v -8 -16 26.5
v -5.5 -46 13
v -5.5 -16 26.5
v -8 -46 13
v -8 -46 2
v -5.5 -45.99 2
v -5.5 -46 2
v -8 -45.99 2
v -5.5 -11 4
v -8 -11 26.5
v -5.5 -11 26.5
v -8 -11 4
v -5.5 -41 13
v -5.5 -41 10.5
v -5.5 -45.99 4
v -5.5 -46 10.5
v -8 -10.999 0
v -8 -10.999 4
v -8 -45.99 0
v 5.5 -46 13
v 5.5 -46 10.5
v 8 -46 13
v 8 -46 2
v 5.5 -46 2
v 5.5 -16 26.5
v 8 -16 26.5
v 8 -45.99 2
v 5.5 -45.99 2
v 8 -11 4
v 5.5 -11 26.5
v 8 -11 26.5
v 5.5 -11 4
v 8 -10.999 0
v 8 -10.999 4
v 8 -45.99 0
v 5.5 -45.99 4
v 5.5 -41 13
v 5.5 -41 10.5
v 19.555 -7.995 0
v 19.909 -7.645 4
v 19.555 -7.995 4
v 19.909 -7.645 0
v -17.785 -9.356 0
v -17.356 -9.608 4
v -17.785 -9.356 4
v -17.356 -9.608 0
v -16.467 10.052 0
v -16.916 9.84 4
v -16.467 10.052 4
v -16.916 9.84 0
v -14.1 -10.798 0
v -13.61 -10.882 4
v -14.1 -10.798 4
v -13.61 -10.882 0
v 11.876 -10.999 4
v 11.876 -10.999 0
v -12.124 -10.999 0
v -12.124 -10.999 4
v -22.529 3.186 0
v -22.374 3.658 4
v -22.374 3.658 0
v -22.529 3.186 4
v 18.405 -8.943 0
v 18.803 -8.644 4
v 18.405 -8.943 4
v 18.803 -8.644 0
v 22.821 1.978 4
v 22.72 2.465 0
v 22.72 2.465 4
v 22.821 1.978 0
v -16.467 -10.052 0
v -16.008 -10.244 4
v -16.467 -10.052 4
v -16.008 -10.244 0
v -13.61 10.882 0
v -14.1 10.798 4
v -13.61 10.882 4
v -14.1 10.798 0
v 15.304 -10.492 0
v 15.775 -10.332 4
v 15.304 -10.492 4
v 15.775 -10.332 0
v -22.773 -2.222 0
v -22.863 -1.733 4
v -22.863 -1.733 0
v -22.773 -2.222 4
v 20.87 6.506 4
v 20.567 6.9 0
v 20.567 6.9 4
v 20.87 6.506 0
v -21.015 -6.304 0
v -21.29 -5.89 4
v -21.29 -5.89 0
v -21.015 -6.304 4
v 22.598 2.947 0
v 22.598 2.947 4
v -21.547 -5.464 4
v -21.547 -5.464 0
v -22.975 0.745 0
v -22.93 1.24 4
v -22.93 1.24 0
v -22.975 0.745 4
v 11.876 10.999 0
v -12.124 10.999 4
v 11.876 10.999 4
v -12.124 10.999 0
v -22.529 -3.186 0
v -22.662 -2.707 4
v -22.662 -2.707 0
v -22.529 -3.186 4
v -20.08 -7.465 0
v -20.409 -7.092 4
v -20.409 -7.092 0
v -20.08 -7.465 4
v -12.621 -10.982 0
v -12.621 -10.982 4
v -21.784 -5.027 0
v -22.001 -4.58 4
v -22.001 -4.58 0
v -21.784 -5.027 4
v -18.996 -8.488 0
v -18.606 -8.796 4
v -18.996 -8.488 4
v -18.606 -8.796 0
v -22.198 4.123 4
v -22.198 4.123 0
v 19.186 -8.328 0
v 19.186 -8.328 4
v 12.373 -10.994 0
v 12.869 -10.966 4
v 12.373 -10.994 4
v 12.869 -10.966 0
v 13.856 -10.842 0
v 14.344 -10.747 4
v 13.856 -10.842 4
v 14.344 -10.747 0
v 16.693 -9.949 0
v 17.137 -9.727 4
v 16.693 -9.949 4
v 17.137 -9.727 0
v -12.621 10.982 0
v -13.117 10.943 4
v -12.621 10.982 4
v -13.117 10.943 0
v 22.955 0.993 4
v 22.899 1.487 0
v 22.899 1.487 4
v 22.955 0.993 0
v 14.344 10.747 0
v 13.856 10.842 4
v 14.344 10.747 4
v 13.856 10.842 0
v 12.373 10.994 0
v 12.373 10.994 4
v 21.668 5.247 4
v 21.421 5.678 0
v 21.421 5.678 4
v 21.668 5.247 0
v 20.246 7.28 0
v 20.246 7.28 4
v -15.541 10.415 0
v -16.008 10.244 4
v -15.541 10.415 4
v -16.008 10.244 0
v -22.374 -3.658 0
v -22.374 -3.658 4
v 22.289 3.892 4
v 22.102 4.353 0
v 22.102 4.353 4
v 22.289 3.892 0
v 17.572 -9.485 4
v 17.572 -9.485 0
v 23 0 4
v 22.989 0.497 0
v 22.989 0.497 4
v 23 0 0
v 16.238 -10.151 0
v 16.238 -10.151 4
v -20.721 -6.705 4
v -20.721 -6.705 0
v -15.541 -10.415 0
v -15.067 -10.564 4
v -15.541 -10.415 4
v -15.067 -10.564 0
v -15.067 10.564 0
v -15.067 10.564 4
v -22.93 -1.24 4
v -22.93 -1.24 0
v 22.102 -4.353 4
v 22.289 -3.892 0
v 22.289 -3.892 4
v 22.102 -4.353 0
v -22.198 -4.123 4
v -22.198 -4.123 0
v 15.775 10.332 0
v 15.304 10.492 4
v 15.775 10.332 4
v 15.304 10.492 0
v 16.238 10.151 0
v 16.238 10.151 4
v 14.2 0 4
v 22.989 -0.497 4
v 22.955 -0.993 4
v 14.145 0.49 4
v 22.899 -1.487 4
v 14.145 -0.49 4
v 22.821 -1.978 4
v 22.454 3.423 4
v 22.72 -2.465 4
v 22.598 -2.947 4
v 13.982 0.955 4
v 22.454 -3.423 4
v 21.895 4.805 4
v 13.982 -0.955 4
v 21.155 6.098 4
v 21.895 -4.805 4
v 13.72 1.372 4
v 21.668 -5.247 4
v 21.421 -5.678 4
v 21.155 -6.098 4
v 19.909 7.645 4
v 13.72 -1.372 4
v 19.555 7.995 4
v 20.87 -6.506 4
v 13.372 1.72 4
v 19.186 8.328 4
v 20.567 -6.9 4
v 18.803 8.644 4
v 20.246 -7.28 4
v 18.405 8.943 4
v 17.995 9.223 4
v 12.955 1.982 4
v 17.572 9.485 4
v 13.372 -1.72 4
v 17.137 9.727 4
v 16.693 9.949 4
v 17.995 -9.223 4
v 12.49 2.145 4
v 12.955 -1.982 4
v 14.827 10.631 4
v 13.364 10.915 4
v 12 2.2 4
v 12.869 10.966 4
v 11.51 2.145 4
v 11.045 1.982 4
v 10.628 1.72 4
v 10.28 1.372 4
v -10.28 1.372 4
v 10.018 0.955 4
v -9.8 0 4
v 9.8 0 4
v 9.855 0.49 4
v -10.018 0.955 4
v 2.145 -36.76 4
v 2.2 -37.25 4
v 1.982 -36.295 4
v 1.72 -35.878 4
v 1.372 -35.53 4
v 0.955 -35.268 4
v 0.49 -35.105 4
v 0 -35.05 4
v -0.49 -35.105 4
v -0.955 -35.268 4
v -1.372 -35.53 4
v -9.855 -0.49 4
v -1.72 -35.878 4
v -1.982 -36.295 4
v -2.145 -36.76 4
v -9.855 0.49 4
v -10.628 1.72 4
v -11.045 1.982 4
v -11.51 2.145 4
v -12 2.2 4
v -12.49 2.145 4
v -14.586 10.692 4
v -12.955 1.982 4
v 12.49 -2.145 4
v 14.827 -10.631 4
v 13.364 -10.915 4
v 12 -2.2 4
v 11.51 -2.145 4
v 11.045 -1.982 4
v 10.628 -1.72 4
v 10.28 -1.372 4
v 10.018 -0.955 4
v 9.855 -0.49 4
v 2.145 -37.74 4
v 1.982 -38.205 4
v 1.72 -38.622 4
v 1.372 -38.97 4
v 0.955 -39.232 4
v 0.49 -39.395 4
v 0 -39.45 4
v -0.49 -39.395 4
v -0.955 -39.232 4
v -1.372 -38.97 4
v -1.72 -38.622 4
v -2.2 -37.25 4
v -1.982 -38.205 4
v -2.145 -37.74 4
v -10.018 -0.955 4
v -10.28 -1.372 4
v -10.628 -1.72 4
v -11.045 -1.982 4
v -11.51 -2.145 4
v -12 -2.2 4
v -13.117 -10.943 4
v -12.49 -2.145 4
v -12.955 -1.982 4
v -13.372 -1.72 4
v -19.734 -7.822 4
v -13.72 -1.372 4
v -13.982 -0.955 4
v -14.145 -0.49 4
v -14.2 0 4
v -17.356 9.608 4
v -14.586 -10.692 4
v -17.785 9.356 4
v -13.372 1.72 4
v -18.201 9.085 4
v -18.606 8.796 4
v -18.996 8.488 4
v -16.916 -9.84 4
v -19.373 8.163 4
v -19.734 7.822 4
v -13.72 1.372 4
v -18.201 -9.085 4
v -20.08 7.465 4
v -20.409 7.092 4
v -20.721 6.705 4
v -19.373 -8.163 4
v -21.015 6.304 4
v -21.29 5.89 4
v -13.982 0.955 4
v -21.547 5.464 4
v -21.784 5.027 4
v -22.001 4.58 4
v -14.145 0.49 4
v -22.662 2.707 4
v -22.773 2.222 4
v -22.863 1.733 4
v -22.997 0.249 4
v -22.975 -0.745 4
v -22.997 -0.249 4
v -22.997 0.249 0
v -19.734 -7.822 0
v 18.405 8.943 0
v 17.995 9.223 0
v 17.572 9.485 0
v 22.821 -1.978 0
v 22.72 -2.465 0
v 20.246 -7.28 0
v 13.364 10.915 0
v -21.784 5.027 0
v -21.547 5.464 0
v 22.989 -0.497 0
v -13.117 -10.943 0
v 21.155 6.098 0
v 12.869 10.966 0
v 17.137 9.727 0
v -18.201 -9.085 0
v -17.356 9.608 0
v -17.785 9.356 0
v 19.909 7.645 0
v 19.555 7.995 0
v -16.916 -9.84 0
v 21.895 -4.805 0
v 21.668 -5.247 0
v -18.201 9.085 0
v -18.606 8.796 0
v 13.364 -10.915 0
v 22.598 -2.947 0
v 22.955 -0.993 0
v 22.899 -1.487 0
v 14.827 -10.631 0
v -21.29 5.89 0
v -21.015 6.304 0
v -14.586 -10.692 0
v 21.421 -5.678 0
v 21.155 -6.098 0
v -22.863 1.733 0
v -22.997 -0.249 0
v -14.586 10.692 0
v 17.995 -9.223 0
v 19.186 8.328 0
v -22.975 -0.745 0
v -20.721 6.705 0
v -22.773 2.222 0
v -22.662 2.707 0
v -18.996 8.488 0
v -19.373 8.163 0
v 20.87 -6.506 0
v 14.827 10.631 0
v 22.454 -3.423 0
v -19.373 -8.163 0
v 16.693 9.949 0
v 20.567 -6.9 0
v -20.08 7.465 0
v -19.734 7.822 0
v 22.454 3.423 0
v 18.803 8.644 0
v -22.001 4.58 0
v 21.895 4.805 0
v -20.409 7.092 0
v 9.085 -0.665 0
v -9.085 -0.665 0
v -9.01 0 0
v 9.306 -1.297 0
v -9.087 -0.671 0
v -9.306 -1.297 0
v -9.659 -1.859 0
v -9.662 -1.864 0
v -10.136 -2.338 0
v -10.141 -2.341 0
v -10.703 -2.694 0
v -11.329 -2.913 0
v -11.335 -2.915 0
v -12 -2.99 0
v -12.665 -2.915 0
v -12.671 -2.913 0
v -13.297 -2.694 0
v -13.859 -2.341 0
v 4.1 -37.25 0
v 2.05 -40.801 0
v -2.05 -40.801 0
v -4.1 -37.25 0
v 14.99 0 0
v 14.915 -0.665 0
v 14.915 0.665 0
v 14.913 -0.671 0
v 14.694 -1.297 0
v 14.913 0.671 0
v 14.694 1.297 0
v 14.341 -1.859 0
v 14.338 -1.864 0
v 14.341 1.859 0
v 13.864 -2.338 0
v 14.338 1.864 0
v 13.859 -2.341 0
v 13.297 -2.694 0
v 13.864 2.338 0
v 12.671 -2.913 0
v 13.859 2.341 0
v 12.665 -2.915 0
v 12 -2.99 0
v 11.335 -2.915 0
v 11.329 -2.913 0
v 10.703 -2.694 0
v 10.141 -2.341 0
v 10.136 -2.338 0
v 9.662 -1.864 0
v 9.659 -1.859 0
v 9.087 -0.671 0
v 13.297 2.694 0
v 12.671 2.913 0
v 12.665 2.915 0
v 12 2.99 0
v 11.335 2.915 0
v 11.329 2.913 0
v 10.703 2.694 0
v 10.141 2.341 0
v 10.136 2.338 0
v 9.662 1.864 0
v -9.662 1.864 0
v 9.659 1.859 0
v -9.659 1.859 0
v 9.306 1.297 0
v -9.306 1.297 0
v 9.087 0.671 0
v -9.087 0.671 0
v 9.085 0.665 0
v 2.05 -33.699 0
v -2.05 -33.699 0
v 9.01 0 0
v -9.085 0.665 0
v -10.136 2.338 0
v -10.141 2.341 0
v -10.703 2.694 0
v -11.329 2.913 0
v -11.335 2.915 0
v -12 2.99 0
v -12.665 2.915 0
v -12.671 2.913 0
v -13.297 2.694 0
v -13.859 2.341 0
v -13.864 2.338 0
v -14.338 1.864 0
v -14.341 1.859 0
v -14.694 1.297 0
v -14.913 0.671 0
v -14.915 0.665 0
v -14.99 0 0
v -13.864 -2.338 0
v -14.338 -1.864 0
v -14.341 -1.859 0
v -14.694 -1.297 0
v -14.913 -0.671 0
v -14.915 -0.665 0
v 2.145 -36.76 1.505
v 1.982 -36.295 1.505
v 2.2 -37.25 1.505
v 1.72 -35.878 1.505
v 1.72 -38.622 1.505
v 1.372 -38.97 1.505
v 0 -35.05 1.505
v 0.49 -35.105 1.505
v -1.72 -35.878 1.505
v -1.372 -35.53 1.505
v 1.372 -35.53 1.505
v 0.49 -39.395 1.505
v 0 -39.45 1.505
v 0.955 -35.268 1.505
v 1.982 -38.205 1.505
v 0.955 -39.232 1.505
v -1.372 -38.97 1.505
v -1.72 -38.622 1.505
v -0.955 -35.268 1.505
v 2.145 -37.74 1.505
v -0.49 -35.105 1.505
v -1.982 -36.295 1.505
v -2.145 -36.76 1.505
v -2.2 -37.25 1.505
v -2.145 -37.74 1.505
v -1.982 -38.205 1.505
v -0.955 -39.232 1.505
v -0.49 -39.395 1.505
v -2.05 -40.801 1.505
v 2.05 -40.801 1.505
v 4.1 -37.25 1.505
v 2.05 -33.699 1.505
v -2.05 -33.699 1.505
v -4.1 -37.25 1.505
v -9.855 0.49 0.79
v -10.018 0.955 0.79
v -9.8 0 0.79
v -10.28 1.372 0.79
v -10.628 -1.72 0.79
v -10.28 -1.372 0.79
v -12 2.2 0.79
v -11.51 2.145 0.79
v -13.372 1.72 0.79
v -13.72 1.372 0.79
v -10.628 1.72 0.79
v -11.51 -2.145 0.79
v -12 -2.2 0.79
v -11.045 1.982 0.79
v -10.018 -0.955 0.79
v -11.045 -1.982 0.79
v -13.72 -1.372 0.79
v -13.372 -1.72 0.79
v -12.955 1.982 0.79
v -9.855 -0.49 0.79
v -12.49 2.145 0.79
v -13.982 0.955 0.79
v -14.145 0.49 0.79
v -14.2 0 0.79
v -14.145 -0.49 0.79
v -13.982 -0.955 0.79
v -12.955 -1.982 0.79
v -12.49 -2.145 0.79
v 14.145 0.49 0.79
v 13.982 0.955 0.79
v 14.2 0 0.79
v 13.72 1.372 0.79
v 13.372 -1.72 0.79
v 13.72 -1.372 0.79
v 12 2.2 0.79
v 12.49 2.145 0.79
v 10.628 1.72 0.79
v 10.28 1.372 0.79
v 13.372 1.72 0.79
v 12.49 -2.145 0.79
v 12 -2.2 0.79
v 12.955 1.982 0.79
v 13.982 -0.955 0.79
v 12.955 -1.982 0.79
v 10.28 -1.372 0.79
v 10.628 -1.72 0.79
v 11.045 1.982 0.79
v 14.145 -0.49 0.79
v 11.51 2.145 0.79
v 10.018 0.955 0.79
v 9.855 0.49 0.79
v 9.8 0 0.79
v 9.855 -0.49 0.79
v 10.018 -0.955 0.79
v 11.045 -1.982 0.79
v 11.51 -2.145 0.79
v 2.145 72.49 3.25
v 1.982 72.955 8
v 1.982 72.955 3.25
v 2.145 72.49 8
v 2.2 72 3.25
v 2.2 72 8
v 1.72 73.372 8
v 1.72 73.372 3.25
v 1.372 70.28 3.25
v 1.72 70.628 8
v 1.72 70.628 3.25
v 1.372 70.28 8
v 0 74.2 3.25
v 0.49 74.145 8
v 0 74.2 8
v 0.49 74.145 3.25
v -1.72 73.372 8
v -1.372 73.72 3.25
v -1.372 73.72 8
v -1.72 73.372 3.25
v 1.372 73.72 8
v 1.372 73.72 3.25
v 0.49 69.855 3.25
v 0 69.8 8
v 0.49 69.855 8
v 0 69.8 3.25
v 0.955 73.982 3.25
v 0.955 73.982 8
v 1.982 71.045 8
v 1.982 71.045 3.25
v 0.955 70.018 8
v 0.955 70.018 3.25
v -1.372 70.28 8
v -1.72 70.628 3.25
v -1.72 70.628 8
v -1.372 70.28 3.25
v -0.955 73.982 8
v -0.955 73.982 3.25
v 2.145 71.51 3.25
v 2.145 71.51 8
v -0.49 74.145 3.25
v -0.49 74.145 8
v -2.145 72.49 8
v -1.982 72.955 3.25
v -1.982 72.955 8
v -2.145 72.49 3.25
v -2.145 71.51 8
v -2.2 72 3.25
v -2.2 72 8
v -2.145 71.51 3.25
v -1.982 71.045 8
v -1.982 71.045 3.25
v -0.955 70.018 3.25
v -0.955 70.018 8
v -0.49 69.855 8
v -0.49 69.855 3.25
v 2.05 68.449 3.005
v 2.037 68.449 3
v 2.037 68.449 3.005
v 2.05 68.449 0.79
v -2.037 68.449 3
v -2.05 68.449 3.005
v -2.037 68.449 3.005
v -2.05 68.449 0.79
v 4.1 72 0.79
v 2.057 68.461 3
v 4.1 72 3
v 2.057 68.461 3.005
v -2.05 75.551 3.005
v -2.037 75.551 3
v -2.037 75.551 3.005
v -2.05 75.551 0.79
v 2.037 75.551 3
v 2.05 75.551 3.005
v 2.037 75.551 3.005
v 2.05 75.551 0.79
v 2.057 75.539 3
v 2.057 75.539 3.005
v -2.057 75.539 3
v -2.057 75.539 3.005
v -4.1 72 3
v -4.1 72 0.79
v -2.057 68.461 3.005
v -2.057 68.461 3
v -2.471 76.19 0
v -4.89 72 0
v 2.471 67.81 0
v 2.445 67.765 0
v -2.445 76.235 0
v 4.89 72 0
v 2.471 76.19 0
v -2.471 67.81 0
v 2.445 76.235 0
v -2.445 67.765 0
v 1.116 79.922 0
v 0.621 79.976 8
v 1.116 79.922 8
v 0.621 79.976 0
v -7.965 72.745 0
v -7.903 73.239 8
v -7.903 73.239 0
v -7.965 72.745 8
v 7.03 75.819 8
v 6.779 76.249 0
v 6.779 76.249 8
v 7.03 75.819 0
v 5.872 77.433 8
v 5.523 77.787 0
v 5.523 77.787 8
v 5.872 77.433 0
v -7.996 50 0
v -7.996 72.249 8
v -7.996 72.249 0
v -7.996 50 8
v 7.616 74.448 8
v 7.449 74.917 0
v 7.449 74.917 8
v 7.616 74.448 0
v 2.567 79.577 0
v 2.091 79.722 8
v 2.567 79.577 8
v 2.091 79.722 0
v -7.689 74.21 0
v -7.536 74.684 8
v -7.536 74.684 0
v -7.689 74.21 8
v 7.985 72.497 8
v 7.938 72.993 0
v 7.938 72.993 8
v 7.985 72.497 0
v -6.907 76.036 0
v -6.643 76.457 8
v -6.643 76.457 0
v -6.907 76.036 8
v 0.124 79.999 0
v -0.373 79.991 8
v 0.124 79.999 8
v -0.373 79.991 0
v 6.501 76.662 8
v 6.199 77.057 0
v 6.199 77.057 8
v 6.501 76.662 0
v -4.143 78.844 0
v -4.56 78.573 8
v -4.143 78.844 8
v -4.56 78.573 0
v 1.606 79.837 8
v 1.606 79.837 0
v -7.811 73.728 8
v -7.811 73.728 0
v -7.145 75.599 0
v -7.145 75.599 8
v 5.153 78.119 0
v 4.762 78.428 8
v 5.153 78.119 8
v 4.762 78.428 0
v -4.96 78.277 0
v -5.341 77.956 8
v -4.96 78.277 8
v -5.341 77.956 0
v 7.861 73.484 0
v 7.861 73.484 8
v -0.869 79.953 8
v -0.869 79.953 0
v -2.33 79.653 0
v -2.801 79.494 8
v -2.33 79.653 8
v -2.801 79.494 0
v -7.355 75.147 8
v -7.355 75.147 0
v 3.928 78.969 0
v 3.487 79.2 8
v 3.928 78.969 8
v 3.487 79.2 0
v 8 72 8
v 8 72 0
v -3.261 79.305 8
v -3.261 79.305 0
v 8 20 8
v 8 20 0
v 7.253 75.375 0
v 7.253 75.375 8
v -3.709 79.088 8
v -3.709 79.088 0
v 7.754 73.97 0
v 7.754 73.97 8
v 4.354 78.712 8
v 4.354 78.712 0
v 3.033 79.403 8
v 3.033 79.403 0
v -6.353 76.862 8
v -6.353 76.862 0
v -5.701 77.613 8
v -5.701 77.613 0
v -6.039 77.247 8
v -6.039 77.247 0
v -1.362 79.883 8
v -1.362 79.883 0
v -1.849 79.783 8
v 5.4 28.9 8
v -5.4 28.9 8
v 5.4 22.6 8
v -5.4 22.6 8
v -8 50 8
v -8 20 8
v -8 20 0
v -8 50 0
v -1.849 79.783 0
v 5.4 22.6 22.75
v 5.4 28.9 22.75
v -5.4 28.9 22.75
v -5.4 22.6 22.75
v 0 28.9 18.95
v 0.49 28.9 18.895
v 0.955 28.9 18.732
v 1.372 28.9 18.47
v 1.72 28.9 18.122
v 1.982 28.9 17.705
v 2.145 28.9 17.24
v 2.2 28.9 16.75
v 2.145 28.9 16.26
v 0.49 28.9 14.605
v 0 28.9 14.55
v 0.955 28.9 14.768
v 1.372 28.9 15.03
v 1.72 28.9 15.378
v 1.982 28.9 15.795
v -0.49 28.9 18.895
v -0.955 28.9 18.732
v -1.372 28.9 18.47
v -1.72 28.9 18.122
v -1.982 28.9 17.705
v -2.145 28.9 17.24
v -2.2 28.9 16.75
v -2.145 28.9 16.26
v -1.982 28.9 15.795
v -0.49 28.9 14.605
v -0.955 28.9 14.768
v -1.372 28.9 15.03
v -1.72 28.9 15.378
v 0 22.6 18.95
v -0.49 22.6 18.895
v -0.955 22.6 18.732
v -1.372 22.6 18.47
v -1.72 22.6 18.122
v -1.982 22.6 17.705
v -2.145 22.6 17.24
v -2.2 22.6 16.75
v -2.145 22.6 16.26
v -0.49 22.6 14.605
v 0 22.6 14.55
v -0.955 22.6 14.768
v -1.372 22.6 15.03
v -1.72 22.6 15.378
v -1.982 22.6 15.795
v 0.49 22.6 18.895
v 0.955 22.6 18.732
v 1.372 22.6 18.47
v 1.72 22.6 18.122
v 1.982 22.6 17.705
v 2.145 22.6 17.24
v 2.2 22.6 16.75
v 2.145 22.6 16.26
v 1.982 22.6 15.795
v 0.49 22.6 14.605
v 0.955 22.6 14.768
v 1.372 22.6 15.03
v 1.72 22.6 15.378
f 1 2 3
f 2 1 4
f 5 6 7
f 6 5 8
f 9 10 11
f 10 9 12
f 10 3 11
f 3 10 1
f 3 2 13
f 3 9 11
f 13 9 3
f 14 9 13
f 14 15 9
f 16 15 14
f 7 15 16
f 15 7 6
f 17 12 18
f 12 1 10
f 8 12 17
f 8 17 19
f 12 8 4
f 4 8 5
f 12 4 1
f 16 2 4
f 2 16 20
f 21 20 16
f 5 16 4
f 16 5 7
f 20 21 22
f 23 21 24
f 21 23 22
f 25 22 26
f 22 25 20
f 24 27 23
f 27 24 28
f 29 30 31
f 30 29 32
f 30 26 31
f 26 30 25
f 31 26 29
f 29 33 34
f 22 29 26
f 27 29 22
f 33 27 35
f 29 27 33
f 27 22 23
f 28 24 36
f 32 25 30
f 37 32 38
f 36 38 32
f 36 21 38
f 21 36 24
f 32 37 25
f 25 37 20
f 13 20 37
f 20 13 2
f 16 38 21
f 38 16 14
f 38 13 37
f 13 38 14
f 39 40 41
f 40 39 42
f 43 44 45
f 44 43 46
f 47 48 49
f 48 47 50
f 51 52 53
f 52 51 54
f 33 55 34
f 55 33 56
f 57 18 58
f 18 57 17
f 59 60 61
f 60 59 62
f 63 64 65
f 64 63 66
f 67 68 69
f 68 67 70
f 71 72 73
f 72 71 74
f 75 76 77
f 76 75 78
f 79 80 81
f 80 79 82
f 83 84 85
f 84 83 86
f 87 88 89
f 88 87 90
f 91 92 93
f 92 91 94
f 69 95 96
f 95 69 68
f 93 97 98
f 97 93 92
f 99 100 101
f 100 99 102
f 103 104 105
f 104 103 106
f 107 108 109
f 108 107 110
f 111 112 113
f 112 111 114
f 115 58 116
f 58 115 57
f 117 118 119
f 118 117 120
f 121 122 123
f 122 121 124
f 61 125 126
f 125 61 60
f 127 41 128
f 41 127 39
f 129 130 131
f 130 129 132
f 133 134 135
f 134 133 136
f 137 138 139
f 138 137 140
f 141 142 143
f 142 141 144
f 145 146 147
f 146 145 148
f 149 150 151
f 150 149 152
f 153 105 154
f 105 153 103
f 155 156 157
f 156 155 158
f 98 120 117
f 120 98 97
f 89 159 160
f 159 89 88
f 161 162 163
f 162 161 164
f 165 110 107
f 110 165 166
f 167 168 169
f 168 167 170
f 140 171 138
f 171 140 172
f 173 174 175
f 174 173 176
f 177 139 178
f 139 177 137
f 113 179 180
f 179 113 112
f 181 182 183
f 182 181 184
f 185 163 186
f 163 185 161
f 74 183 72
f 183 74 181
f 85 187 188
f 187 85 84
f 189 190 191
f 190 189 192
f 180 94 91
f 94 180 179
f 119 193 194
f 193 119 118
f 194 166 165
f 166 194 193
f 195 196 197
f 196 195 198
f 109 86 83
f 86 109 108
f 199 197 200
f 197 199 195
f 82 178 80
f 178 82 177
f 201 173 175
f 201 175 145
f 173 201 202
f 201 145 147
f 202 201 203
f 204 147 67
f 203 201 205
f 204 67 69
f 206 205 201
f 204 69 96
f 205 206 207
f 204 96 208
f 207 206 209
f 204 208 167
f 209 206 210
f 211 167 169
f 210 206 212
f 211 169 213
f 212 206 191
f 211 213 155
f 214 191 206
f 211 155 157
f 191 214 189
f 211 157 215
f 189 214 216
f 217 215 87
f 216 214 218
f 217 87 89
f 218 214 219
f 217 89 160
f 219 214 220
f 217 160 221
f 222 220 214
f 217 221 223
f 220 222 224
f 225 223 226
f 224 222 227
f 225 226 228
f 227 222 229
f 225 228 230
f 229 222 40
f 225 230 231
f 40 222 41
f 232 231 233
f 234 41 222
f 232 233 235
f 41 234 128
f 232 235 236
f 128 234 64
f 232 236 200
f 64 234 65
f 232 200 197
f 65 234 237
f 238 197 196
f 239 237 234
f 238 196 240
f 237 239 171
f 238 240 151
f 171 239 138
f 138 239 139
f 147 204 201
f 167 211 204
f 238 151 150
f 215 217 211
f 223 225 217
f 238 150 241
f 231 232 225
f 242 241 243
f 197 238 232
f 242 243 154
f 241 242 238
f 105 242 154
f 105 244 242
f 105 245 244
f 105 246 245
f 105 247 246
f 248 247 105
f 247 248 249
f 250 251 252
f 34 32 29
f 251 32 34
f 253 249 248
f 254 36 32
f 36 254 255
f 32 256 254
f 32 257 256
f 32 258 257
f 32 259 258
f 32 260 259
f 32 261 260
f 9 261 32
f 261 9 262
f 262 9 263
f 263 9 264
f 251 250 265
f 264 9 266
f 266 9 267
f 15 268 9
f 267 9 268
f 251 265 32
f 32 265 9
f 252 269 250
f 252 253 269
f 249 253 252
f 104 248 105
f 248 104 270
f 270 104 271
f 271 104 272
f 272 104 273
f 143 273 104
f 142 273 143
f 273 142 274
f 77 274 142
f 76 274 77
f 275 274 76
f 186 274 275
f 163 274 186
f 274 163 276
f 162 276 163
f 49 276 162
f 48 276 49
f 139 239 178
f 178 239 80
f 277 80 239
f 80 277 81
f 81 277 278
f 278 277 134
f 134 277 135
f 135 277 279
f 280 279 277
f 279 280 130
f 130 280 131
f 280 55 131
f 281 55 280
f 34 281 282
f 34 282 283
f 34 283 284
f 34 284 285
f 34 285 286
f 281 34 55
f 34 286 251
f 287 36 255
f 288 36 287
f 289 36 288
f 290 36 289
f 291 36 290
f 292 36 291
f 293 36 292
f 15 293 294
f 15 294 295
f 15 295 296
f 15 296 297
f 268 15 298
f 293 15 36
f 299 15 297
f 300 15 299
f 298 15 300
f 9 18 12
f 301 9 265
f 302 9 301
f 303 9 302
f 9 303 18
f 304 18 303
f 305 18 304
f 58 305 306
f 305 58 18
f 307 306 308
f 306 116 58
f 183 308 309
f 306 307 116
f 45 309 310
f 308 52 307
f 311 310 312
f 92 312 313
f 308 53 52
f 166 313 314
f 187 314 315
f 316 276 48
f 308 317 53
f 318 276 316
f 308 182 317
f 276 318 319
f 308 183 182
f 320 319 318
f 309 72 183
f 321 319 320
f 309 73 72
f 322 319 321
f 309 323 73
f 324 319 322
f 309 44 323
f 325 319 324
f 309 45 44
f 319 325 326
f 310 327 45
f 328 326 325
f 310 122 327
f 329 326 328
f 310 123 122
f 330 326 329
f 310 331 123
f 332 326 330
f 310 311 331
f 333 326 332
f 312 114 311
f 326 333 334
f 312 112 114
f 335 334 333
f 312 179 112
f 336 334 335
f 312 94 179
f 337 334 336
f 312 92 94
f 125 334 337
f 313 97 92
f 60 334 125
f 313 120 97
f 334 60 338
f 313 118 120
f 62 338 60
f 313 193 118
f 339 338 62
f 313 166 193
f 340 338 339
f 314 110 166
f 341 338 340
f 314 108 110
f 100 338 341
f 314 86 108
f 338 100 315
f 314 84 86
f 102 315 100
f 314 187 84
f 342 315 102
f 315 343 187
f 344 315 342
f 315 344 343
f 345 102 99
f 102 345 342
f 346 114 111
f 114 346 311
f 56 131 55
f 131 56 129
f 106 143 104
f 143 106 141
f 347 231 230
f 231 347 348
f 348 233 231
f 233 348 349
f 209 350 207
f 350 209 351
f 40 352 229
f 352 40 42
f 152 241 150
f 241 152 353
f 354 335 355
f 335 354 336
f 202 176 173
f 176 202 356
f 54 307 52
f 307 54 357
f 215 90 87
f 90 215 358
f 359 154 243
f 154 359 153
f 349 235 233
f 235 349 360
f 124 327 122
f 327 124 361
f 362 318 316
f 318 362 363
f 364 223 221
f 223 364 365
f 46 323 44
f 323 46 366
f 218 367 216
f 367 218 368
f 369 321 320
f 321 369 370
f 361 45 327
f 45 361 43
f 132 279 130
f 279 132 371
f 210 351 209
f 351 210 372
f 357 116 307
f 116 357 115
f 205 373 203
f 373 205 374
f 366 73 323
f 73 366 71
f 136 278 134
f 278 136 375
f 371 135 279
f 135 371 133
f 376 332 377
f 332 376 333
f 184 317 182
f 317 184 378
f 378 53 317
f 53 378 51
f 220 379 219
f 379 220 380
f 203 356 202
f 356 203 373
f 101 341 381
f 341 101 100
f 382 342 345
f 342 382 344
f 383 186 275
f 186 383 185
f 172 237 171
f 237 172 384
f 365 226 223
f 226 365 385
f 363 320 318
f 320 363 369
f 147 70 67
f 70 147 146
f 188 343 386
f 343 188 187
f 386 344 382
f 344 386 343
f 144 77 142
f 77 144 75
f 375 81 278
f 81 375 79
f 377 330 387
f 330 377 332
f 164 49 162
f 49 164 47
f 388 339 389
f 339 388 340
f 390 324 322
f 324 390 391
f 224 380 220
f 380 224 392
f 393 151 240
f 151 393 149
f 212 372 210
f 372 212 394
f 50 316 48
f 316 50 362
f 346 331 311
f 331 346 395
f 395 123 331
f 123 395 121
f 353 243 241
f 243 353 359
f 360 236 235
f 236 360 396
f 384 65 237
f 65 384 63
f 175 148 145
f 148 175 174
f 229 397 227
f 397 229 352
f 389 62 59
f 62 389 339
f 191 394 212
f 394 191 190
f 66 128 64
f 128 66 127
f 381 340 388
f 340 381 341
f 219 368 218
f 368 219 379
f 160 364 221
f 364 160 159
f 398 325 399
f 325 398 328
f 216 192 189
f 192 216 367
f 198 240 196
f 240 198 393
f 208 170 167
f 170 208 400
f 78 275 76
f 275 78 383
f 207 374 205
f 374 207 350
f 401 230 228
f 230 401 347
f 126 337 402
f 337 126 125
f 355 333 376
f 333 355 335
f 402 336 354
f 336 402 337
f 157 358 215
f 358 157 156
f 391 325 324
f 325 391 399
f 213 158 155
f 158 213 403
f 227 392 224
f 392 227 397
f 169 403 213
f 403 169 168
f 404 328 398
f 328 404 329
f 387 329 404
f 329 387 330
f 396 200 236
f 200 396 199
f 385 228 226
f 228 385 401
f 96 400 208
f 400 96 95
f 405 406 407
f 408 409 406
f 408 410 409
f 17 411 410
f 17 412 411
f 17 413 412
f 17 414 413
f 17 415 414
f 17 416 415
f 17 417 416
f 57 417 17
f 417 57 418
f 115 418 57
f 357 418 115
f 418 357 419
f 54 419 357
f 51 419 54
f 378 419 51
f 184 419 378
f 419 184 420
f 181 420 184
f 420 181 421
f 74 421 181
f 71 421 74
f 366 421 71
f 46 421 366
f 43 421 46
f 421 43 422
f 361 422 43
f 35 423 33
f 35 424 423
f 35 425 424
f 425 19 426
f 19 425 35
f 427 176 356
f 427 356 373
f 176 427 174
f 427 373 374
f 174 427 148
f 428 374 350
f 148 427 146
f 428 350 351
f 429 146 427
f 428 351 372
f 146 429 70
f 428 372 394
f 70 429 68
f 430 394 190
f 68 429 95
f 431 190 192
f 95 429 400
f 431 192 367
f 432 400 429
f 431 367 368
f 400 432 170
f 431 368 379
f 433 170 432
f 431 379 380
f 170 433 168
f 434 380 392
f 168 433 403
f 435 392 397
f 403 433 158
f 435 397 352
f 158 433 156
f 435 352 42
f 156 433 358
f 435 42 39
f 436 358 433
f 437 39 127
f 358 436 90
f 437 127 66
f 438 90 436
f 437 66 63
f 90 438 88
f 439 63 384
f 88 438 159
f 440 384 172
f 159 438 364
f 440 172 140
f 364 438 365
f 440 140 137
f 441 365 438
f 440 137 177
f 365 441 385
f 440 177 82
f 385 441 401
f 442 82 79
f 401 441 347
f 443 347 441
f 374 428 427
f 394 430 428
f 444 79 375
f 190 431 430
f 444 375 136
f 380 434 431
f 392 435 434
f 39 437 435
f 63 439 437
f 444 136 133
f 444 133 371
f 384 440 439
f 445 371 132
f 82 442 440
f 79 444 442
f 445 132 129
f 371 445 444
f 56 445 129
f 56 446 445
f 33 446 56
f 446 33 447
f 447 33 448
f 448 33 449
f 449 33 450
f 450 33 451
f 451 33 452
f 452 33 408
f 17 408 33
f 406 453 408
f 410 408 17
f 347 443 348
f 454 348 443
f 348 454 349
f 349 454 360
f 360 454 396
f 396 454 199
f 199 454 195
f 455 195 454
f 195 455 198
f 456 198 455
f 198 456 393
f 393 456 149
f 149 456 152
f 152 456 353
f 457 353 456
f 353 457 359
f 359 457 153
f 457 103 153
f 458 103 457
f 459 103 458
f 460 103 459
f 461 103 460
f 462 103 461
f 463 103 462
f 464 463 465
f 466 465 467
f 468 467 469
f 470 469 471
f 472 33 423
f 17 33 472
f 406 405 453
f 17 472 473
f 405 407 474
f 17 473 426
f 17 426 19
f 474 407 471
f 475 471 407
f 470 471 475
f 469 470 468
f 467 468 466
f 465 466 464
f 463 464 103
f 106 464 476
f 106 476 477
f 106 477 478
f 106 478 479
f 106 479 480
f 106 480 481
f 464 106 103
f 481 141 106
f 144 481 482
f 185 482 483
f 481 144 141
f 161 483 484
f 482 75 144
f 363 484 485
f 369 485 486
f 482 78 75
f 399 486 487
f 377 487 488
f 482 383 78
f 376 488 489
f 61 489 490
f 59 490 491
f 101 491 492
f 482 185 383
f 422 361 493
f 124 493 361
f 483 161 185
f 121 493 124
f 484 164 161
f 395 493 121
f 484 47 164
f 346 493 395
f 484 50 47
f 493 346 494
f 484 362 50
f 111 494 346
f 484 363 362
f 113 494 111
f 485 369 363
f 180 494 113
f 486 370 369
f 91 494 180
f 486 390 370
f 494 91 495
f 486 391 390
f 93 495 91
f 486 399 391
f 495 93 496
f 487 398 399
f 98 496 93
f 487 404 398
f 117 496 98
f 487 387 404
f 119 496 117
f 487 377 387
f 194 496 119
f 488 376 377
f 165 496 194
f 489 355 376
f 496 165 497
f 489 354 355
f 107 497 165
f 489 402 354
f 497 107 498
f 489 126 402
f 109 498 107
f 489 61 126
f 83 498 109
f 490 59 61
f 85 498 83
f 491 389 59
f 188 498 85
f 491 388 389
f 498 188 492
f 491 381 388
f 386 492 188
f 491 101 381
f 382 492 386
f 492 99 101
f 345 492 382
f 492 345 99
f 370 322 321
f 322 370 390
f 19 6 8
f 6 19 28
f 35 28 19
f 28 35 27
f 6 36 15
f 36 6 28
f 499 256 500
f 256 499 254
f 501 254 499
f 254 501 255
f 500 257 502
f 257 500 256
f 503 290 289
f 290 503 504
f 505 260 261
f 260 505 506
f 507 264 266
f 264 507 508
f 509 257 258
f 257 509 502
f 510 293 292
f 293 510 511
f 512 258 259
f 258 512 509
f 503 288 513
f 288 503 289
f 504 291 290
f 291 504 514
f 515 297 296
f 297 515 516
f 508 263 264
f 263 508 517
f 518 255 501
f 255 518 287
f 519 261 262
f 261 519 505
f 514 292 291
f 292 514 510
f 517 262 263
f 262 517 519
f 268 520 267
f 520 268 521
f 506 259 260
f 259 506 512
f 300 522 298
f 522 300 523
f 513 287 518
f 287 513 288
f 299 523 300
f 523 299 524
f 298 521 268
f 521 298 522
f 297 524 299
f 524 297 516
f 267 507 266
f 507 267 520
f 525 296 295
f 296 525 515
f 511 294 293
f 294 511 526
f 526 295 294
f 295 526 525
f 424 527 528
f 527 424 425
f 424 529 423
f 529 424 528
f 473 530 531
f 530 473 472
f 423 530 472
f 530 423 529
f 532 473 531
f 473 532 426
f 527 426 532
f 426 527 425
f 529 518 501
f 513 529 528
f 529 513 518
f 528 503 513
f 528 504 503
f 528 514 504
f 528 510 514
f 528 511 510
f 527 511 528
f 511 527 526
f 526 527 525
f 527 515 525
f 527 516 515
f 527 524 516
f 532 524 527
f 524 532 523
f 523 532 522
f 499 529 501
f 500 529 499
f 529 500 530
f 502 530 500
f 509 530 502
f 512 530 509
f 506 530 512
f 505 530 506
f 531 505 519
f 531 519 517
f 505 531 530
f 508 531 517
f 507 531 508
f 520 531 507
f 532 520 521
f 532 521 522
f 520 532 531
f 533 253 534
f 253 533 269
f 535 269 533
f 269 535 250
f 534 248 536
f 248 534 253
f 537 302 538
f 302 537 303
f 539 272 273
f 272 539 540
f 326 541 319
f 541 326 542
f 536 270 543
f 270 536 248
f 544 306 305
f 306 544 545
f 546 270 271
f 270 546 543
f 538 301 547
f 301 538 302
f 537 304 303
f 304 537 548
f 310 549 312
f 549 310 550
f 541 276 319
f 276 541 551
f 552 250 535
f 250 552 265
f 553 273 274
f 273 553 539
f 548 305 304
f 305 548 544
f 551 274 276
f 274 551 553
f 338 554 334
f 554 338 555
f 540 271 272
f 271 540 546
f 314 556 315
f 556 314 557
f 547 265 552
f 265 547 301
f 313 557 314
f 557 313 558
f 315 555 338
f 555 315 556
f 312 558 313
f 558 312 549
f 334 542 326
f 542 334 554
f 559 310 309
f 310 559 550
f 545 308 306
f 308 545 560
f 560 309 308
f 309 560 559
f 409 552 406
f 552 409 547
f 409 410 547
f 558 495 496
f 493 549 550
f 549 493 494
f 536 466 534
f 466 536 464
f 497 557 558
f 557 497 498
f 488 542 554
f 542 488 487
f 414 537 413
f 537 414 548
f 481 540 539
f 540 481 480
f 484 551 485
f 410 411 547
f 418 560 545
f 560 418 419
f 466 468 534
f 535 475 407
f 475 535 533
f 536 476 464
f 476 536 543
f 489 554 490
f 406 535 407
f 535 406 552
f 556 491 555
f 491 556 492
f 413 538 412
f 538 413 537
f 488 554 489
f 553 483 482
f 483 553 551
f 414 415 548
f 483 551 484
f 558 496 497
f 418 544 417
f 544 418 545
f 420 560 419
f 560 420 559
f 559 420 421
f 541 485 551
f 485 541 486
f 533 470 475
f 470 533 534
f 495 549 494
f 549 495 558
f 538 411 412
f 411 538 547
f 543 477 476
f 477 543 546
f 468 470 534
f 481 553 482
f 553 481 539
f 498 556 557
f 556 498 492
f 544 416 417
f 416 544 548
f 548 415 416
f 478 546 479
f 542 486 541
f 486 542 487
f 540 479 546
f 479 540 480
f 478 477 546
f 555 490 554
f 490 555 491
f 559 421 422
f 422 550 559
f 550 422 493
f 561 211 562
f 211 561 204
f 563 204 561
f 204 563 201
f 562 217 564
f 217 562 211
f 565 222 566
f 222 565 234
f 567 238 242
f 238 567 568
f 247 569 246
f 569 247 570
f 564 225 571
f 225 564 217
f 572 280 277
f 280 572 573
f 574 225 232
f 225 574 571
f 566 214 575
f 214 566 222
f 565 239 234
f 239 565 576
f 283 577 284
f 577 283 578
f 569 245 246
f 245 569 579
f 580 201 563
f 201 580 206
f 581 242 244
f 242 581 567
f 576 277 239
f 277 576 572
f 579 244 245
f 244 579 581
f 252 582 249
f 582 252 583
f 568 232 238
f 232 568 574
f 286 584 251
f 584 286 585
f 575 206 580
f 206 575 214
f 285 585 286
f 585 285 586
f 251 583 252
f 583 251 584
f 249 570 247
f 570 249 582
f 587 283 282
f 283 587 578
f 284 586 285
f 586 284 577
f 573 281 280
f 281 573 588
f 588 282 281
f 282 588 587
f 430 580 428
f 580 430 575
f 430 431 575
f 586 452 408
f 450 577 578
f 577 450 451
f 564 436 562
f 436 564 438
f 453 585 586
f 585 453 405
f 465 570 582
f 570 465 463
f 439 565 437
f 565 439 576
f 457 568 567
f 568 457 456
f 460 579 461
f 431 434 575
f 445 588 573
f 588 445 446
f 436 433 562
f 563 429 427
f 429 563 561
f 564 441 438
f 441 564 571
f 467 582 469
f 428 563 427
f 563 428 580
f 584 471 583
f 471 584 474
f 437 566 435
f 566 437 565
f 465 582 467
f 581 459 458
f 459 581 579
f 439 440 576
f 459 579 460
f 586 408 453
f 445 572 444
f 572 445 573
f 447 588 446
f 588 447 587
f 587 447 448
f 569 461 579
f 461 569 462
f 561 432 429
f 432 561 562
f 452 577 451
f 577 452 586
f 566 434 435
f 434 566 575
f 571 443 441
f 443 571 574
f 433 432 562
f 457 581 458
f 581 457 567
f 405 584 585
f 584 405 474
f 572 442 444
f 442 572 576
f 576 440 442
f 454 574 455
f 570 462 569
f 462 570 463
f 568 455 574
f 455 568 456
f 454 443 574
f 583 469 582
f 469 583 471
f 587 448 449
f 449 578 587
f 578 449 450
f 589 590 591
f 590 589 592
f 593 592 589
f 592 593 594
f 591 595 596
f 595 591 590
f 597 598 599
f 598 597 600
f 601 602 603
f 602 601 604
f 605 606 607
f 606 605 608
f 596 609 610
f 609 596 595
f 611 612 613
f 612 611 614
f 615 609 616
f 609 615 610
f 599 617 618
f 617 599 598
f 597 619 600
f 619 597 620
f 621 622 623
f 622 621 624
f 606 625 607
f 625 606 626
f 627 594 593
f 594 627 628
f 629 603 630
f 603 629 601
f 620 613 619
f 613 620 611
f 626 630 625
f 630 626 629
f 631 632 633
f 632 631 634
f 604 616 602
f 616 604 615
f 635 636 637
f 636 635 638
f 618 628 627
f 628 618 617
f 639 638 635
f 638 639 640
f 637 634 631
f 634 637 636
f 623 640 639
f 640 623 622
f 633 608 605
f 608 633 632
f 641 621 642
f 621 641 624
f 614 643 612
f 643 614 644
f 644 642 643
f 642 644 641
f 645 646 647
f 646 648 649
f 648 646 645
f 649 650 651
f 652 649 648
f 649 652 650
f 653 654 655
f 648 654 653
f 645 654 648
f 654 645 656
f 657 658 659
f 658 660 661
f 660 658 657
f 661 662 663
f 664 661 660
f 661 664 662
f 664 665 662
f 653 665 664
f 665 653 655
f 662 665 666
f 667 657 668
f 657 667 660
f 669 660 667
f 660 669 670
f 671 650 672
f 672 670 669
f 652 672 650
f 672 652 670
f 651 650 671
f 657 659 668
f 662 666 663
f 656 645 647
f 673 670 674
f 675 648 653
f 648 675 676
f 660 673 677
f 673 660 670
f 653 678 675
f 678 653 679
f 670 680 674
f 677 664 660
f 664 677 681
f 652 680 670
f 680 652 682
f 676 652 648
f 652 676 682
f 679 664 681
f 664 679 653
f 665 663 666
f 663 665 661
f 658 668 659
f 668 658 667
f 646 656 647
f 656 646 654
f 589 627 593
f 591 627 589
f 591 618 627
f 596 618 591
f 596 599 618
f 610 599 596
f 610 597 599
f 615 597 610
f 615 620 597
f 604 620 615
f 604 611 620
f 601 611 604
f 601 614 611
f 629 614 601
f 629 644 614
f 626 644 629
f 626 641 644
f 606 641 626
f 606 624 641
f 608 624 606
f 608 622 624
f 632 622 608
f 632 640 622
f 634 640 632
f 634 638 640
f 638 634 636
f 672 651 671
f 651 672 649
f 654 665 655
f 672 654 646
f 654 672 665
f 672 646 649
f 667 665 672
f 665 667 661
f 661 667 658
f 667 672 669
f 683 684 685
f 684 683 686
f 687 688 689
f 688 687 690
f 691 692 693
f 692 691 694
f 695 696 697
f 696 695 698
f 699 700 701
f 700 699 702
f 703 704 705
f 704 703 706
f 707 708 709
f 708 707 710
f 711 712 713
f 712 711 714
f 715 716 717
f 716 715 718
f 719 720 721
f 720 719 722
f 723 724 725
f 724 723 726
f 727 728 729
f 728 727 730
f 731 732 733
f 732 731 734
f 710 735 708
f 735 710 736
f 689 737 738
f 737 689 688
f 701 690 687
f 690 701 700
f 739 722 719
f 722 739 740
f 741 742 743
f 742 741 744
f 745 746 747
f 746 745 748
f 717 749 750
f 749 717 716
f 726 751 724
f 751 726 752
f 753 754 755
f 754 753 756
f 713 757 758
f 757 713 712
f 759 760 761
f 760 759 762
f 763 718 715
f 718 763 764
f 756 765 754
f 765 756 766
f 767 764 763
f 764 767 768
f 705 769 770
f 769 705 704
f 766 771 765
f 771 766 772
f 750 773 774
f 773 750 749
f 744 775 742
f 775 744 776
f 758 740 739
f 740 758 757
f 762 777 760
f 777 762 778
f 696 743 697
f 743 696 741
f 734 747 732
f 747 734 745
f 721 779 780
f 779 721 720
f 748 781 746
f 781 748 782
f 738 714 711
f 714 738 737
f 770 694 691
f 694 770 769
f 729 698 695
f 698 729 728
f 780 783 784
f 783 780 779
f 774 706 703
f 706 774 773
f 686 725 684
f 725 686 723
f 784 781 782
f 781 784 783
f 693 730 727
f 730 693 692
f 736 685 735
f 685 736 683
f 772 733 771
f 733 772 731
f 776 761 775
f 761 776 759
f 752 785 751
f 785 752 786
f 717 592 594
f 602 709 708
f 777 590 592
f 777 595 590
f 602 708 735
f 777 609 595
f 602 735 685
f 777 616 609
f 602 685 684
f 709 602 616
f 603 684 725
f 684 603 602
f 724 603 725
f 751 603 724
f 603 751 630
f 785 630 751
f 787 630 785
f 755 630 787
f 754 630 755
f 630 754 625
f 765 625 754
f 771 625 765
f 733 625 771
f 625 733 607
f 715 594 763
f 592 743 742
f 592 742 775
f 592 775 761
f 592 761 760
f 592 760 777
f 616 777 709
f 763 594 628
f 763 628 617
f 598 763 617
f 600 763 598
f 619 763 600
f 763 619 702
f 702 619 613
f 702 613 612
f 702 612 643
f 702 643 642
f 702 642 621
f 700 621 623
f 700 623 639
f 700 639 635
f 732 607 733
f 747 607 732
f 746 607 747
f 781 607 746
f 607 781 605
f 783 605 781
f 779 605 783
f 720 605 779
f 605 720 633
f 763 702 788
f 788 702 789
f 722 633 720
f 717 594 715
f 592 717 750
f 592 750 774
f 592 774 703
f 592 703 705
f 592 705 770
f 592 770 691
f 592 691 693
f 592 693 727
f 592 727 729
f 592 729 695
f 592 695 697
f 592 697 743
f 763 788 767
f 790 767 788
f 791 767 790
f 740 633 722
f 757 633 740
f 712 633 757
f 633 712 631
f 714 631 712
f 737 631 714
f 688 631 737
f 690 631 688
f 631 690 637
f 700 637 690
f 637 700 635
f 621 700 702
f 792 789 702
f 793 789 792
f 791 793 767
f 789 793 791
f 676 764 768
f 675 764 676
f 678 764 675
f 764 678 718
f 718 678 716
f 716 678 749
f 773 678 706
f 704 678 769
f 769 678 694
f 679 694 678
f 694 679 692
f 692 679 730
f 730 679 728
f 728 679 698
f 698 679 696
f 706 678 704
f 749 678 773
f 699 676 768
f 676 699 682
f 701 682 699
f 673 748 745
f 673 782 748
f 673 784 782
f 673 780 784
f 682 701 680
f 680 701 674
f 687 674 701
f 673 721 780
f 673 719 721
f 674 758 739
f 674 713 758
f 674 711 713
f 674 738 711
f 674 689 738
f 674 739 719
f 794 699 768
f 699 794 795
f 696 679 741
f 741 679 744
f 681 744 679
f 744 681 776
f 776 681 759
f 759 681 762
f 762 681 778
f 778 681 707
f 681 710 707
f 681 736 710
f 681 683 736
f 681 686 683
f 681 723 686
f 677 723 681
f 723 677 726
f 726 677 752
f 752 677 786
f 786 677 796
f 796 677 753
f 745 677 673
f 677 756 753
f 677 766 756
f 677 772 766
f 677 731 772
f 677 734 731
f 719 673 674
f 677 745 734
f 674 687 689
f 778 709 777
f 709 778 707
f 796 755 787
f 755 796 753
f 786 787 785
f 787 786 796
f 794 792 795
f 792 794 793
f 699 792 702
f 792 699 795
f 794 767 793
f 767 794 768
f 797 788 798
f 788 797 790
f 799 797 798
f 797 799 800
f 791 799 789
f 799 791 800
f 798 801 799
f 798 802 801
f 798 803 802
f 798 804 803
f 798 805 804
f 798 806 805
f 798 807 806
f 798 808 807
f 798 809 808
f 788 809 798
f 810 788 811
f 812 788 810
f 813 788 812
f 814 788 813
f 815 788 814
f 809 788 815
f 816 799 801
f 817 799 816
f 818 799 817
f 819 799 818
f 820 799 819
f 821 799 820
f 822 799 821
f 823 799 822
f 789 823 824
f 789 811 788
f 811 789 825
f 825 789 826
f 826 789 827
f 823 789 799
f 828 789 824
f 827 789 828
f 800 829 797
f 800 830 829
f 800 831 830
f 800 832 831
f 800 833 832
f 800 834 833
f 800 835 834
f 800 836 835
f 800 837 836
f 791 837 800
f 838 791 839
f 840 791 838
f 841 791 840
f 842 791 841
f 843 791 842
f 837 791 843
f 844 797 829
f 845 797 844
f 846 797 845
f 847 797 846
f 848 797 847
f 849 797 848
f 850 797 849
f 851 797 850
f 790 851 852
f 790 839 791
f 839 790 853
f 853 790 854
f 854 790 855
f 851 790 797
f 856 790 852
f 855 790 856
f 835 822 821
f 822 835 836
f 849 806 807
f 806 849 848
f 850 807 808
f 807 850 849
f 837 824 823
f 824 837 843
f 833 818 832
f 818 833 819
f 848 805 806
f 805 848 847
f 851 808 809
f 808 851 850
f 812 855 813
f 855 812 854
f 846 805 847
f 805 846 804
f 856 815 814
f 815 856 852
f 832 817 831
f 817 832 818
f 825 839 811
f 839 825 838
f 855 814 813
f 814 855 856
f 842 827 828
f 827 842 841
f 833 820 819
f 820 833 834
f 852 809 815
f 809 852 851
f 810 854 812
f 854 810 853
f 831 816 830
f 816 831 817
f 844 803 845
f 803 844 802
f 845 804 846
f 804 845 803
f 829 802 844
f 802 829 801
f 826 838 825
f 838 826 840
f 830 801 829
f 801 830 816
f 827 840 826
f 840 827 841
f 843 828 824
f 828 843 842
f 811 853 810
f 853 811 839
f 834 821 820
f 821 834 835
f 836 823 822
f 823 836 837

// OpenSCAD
include <cloverplus_v3_utils.scad>;
$fs = 0.5;
$fa = 0.5;
//---------------------------------------------------------------------------------------------------- 
// CloverPlus v3 extruder mount by pbmax (mpeterson333/@/gmail.com)
//---------------------------------------------------------------------------------------------------- 
// This is a bracket that mounts a PG35L extruder to the cloverplus bottom base part.
//
// Note that this part uses variables from cloverplus_v3_utils.scad
//---------------------------------------------------------------------------------------------------- 
cloverplus_v3_extruder_mount();

module cloverplus_v3_extruder_mount(mockup = false)
{

  extruder_mount_lower();

  translate([0, 20, 0])
  extruder_mount_upper();

  gap_ff = 0.2;

  mount_gap_x = extruder_mount_w - extruder_mount_t - gap_ff;
  mount_gap_y = base_width*0.5-extruder_mount_base_t*0.5-extruder_mount_t*0.5 - gap_ff;
  
  module extruder_mount_lower(mockup = false)
  {
    translate([0, 0, extruder_mount_base_t*0.5])
    difference()
    {
      union()
      {
        // Base mount
        hull()
          for(i = [-1,1])
            translate([i*bottom_leg_extruder_mount_holes_spacing*0.5, 0, 0])
              cylinder(h=extruder_mount_base_t, d=base_width, center=true);
  
        // overhang
        translate([0, -base_width*0.5-extruder_mount_overhang*0.5+ff, 0])
          cube([extruder_mount_w, extruder_mount_overhang, extruder_mount_base_t], center=true);
  
        // Upright part the extruder mounts to
        difference()
        {

          union()
          {
            // Supports
            for(i = [-1,1])
              translate([i*(extruder_mount_w*0.5-extruder_mount_t*0.25), 
                         -extruder_mount_overhang*0.5-base_width*0.5, 
                         0])
                hull()
                {
                  translate([0,0, base_width*0.25])
                    cube([extruder_mount_t*0.5, extruder_mount_overhang, base_width*0.5], center=true);
                  translate([0, extruder_mount_overhang*0.5-extruder_mount_t*0.5, base_width*0.5+extruder_mount_t*0.5])
                    cube([extruder_mount_t*0.5, extruder_mount_t, base_width], center=true);
                }
            // Crossbrace
            translate([0, 
                       -extruder_mount_overhang+extruder_mount_t*0.5-base_width*0.5, 
                       base_width*0.5 - extruder_mount_t*0.25])
              cube([extruder_mount_w, extruder_mount_t, extruder_mount_t*0.5], center=true);
          }
        }
      }
      // Nuttrap for extruder upper mount attach
      translate([0, 
                 -base_width*0.5-extruder_mount_overhang*0.75, 
                 -extruder_m4_nuttrap_depth*0.5-extruder_mount_base_t*0.5])
          nuttrap(m4_hole_d, extruder_mount_t, m4_nuttrap_d, extruder_m4_nuttrap_depth, smash_comp_enable=true);

      // Screw holes for base attach
      for(i = [-1,1])
        translate([i*bottom_leg_extruder_mount_holes_spacing*0.5, 0, 0])
        {
          cylinder(h=extruder_mount_t*2, d=m4_hole_d, center=true);
          translate([0, 0, -extruder_mount_base_t*0.5-ff])
            hole_smash_comp(m4_hole_d);
        }

    }
  }

  module extruder_mount_upper()
  {
    mount_thick_mult = 2;
    difference()
    {
      union()
      {
        // Lower part of the mount
        translate([-extruder_mount_w*0.5, 0, 0])
          cube([extruder_mount_w, base_width+extruder_mount_w*0.5, extruder_mount_base_t*mount_thick_mult]);
        // Gap tab
        translate([-mount_gap_x*0.5, extruder_mount_t*0.5+gap_ff*0.5, extruder_mount_base_t*mount_thick_mult])
          cube([mount_gap_x, mount_gap_y, extruder_mount_overhang*0.25+extruder_mount_base_t*mount_thick_mult*0.75]);
        // Extruder mount
        translate([0, base_width+extruder_mount_w*0.5, extruder_mount_base_t*mount_thick_mult*0.5])
          //rotate([0, 0, -extruder_mount_angle])
            difference()
            {
              hull()
              {
                translate([0, extruder_mount_h-extruder_mount_w*0.5, 0])
                  cylinder(h=extruder_mount_base_t*mount_thick_mult, d=extruder_mount_w, center=true);
                cylinder(h=extruder_mount_base_t*mount_thick_mult, d=extruder_mount_w, center=true);
              }
              //for(i= [0, extruder_mount_screw_spacing])
              //  translate([0, extruder_mount_h-extruder_mount_w*0.5-i, extruder_mount_base_t*mount_thick_mult*0.6])
              //    rotate([180,0,0])
              translate([0, extruder_mount_h-extruder_mount_w*0.5, -extruder_mount_base_t*mount_thick_mult*0.5])
                nuttrap(m4_hole_d, extruder_mount_t*mount_thick_mult, m4_nuttrap_d, extruder_m4_nuttrap_depth, 
                          smash_comp_enable=true, membrane_bridge=0.25);
            }
      }


      translate([0, 
                 extruder_mount_t*0.5+gap_ff*0.5+mount_gap_y*0.5, 
                 extruder_mount_base_t*mount_thick_mult+extruder_mount_overhang*0.25])
        rotate([90,0,0])
          cylinder(h=mount_gap_y+ff, d=m4_hole_d, center=true);
    }
  }
}
